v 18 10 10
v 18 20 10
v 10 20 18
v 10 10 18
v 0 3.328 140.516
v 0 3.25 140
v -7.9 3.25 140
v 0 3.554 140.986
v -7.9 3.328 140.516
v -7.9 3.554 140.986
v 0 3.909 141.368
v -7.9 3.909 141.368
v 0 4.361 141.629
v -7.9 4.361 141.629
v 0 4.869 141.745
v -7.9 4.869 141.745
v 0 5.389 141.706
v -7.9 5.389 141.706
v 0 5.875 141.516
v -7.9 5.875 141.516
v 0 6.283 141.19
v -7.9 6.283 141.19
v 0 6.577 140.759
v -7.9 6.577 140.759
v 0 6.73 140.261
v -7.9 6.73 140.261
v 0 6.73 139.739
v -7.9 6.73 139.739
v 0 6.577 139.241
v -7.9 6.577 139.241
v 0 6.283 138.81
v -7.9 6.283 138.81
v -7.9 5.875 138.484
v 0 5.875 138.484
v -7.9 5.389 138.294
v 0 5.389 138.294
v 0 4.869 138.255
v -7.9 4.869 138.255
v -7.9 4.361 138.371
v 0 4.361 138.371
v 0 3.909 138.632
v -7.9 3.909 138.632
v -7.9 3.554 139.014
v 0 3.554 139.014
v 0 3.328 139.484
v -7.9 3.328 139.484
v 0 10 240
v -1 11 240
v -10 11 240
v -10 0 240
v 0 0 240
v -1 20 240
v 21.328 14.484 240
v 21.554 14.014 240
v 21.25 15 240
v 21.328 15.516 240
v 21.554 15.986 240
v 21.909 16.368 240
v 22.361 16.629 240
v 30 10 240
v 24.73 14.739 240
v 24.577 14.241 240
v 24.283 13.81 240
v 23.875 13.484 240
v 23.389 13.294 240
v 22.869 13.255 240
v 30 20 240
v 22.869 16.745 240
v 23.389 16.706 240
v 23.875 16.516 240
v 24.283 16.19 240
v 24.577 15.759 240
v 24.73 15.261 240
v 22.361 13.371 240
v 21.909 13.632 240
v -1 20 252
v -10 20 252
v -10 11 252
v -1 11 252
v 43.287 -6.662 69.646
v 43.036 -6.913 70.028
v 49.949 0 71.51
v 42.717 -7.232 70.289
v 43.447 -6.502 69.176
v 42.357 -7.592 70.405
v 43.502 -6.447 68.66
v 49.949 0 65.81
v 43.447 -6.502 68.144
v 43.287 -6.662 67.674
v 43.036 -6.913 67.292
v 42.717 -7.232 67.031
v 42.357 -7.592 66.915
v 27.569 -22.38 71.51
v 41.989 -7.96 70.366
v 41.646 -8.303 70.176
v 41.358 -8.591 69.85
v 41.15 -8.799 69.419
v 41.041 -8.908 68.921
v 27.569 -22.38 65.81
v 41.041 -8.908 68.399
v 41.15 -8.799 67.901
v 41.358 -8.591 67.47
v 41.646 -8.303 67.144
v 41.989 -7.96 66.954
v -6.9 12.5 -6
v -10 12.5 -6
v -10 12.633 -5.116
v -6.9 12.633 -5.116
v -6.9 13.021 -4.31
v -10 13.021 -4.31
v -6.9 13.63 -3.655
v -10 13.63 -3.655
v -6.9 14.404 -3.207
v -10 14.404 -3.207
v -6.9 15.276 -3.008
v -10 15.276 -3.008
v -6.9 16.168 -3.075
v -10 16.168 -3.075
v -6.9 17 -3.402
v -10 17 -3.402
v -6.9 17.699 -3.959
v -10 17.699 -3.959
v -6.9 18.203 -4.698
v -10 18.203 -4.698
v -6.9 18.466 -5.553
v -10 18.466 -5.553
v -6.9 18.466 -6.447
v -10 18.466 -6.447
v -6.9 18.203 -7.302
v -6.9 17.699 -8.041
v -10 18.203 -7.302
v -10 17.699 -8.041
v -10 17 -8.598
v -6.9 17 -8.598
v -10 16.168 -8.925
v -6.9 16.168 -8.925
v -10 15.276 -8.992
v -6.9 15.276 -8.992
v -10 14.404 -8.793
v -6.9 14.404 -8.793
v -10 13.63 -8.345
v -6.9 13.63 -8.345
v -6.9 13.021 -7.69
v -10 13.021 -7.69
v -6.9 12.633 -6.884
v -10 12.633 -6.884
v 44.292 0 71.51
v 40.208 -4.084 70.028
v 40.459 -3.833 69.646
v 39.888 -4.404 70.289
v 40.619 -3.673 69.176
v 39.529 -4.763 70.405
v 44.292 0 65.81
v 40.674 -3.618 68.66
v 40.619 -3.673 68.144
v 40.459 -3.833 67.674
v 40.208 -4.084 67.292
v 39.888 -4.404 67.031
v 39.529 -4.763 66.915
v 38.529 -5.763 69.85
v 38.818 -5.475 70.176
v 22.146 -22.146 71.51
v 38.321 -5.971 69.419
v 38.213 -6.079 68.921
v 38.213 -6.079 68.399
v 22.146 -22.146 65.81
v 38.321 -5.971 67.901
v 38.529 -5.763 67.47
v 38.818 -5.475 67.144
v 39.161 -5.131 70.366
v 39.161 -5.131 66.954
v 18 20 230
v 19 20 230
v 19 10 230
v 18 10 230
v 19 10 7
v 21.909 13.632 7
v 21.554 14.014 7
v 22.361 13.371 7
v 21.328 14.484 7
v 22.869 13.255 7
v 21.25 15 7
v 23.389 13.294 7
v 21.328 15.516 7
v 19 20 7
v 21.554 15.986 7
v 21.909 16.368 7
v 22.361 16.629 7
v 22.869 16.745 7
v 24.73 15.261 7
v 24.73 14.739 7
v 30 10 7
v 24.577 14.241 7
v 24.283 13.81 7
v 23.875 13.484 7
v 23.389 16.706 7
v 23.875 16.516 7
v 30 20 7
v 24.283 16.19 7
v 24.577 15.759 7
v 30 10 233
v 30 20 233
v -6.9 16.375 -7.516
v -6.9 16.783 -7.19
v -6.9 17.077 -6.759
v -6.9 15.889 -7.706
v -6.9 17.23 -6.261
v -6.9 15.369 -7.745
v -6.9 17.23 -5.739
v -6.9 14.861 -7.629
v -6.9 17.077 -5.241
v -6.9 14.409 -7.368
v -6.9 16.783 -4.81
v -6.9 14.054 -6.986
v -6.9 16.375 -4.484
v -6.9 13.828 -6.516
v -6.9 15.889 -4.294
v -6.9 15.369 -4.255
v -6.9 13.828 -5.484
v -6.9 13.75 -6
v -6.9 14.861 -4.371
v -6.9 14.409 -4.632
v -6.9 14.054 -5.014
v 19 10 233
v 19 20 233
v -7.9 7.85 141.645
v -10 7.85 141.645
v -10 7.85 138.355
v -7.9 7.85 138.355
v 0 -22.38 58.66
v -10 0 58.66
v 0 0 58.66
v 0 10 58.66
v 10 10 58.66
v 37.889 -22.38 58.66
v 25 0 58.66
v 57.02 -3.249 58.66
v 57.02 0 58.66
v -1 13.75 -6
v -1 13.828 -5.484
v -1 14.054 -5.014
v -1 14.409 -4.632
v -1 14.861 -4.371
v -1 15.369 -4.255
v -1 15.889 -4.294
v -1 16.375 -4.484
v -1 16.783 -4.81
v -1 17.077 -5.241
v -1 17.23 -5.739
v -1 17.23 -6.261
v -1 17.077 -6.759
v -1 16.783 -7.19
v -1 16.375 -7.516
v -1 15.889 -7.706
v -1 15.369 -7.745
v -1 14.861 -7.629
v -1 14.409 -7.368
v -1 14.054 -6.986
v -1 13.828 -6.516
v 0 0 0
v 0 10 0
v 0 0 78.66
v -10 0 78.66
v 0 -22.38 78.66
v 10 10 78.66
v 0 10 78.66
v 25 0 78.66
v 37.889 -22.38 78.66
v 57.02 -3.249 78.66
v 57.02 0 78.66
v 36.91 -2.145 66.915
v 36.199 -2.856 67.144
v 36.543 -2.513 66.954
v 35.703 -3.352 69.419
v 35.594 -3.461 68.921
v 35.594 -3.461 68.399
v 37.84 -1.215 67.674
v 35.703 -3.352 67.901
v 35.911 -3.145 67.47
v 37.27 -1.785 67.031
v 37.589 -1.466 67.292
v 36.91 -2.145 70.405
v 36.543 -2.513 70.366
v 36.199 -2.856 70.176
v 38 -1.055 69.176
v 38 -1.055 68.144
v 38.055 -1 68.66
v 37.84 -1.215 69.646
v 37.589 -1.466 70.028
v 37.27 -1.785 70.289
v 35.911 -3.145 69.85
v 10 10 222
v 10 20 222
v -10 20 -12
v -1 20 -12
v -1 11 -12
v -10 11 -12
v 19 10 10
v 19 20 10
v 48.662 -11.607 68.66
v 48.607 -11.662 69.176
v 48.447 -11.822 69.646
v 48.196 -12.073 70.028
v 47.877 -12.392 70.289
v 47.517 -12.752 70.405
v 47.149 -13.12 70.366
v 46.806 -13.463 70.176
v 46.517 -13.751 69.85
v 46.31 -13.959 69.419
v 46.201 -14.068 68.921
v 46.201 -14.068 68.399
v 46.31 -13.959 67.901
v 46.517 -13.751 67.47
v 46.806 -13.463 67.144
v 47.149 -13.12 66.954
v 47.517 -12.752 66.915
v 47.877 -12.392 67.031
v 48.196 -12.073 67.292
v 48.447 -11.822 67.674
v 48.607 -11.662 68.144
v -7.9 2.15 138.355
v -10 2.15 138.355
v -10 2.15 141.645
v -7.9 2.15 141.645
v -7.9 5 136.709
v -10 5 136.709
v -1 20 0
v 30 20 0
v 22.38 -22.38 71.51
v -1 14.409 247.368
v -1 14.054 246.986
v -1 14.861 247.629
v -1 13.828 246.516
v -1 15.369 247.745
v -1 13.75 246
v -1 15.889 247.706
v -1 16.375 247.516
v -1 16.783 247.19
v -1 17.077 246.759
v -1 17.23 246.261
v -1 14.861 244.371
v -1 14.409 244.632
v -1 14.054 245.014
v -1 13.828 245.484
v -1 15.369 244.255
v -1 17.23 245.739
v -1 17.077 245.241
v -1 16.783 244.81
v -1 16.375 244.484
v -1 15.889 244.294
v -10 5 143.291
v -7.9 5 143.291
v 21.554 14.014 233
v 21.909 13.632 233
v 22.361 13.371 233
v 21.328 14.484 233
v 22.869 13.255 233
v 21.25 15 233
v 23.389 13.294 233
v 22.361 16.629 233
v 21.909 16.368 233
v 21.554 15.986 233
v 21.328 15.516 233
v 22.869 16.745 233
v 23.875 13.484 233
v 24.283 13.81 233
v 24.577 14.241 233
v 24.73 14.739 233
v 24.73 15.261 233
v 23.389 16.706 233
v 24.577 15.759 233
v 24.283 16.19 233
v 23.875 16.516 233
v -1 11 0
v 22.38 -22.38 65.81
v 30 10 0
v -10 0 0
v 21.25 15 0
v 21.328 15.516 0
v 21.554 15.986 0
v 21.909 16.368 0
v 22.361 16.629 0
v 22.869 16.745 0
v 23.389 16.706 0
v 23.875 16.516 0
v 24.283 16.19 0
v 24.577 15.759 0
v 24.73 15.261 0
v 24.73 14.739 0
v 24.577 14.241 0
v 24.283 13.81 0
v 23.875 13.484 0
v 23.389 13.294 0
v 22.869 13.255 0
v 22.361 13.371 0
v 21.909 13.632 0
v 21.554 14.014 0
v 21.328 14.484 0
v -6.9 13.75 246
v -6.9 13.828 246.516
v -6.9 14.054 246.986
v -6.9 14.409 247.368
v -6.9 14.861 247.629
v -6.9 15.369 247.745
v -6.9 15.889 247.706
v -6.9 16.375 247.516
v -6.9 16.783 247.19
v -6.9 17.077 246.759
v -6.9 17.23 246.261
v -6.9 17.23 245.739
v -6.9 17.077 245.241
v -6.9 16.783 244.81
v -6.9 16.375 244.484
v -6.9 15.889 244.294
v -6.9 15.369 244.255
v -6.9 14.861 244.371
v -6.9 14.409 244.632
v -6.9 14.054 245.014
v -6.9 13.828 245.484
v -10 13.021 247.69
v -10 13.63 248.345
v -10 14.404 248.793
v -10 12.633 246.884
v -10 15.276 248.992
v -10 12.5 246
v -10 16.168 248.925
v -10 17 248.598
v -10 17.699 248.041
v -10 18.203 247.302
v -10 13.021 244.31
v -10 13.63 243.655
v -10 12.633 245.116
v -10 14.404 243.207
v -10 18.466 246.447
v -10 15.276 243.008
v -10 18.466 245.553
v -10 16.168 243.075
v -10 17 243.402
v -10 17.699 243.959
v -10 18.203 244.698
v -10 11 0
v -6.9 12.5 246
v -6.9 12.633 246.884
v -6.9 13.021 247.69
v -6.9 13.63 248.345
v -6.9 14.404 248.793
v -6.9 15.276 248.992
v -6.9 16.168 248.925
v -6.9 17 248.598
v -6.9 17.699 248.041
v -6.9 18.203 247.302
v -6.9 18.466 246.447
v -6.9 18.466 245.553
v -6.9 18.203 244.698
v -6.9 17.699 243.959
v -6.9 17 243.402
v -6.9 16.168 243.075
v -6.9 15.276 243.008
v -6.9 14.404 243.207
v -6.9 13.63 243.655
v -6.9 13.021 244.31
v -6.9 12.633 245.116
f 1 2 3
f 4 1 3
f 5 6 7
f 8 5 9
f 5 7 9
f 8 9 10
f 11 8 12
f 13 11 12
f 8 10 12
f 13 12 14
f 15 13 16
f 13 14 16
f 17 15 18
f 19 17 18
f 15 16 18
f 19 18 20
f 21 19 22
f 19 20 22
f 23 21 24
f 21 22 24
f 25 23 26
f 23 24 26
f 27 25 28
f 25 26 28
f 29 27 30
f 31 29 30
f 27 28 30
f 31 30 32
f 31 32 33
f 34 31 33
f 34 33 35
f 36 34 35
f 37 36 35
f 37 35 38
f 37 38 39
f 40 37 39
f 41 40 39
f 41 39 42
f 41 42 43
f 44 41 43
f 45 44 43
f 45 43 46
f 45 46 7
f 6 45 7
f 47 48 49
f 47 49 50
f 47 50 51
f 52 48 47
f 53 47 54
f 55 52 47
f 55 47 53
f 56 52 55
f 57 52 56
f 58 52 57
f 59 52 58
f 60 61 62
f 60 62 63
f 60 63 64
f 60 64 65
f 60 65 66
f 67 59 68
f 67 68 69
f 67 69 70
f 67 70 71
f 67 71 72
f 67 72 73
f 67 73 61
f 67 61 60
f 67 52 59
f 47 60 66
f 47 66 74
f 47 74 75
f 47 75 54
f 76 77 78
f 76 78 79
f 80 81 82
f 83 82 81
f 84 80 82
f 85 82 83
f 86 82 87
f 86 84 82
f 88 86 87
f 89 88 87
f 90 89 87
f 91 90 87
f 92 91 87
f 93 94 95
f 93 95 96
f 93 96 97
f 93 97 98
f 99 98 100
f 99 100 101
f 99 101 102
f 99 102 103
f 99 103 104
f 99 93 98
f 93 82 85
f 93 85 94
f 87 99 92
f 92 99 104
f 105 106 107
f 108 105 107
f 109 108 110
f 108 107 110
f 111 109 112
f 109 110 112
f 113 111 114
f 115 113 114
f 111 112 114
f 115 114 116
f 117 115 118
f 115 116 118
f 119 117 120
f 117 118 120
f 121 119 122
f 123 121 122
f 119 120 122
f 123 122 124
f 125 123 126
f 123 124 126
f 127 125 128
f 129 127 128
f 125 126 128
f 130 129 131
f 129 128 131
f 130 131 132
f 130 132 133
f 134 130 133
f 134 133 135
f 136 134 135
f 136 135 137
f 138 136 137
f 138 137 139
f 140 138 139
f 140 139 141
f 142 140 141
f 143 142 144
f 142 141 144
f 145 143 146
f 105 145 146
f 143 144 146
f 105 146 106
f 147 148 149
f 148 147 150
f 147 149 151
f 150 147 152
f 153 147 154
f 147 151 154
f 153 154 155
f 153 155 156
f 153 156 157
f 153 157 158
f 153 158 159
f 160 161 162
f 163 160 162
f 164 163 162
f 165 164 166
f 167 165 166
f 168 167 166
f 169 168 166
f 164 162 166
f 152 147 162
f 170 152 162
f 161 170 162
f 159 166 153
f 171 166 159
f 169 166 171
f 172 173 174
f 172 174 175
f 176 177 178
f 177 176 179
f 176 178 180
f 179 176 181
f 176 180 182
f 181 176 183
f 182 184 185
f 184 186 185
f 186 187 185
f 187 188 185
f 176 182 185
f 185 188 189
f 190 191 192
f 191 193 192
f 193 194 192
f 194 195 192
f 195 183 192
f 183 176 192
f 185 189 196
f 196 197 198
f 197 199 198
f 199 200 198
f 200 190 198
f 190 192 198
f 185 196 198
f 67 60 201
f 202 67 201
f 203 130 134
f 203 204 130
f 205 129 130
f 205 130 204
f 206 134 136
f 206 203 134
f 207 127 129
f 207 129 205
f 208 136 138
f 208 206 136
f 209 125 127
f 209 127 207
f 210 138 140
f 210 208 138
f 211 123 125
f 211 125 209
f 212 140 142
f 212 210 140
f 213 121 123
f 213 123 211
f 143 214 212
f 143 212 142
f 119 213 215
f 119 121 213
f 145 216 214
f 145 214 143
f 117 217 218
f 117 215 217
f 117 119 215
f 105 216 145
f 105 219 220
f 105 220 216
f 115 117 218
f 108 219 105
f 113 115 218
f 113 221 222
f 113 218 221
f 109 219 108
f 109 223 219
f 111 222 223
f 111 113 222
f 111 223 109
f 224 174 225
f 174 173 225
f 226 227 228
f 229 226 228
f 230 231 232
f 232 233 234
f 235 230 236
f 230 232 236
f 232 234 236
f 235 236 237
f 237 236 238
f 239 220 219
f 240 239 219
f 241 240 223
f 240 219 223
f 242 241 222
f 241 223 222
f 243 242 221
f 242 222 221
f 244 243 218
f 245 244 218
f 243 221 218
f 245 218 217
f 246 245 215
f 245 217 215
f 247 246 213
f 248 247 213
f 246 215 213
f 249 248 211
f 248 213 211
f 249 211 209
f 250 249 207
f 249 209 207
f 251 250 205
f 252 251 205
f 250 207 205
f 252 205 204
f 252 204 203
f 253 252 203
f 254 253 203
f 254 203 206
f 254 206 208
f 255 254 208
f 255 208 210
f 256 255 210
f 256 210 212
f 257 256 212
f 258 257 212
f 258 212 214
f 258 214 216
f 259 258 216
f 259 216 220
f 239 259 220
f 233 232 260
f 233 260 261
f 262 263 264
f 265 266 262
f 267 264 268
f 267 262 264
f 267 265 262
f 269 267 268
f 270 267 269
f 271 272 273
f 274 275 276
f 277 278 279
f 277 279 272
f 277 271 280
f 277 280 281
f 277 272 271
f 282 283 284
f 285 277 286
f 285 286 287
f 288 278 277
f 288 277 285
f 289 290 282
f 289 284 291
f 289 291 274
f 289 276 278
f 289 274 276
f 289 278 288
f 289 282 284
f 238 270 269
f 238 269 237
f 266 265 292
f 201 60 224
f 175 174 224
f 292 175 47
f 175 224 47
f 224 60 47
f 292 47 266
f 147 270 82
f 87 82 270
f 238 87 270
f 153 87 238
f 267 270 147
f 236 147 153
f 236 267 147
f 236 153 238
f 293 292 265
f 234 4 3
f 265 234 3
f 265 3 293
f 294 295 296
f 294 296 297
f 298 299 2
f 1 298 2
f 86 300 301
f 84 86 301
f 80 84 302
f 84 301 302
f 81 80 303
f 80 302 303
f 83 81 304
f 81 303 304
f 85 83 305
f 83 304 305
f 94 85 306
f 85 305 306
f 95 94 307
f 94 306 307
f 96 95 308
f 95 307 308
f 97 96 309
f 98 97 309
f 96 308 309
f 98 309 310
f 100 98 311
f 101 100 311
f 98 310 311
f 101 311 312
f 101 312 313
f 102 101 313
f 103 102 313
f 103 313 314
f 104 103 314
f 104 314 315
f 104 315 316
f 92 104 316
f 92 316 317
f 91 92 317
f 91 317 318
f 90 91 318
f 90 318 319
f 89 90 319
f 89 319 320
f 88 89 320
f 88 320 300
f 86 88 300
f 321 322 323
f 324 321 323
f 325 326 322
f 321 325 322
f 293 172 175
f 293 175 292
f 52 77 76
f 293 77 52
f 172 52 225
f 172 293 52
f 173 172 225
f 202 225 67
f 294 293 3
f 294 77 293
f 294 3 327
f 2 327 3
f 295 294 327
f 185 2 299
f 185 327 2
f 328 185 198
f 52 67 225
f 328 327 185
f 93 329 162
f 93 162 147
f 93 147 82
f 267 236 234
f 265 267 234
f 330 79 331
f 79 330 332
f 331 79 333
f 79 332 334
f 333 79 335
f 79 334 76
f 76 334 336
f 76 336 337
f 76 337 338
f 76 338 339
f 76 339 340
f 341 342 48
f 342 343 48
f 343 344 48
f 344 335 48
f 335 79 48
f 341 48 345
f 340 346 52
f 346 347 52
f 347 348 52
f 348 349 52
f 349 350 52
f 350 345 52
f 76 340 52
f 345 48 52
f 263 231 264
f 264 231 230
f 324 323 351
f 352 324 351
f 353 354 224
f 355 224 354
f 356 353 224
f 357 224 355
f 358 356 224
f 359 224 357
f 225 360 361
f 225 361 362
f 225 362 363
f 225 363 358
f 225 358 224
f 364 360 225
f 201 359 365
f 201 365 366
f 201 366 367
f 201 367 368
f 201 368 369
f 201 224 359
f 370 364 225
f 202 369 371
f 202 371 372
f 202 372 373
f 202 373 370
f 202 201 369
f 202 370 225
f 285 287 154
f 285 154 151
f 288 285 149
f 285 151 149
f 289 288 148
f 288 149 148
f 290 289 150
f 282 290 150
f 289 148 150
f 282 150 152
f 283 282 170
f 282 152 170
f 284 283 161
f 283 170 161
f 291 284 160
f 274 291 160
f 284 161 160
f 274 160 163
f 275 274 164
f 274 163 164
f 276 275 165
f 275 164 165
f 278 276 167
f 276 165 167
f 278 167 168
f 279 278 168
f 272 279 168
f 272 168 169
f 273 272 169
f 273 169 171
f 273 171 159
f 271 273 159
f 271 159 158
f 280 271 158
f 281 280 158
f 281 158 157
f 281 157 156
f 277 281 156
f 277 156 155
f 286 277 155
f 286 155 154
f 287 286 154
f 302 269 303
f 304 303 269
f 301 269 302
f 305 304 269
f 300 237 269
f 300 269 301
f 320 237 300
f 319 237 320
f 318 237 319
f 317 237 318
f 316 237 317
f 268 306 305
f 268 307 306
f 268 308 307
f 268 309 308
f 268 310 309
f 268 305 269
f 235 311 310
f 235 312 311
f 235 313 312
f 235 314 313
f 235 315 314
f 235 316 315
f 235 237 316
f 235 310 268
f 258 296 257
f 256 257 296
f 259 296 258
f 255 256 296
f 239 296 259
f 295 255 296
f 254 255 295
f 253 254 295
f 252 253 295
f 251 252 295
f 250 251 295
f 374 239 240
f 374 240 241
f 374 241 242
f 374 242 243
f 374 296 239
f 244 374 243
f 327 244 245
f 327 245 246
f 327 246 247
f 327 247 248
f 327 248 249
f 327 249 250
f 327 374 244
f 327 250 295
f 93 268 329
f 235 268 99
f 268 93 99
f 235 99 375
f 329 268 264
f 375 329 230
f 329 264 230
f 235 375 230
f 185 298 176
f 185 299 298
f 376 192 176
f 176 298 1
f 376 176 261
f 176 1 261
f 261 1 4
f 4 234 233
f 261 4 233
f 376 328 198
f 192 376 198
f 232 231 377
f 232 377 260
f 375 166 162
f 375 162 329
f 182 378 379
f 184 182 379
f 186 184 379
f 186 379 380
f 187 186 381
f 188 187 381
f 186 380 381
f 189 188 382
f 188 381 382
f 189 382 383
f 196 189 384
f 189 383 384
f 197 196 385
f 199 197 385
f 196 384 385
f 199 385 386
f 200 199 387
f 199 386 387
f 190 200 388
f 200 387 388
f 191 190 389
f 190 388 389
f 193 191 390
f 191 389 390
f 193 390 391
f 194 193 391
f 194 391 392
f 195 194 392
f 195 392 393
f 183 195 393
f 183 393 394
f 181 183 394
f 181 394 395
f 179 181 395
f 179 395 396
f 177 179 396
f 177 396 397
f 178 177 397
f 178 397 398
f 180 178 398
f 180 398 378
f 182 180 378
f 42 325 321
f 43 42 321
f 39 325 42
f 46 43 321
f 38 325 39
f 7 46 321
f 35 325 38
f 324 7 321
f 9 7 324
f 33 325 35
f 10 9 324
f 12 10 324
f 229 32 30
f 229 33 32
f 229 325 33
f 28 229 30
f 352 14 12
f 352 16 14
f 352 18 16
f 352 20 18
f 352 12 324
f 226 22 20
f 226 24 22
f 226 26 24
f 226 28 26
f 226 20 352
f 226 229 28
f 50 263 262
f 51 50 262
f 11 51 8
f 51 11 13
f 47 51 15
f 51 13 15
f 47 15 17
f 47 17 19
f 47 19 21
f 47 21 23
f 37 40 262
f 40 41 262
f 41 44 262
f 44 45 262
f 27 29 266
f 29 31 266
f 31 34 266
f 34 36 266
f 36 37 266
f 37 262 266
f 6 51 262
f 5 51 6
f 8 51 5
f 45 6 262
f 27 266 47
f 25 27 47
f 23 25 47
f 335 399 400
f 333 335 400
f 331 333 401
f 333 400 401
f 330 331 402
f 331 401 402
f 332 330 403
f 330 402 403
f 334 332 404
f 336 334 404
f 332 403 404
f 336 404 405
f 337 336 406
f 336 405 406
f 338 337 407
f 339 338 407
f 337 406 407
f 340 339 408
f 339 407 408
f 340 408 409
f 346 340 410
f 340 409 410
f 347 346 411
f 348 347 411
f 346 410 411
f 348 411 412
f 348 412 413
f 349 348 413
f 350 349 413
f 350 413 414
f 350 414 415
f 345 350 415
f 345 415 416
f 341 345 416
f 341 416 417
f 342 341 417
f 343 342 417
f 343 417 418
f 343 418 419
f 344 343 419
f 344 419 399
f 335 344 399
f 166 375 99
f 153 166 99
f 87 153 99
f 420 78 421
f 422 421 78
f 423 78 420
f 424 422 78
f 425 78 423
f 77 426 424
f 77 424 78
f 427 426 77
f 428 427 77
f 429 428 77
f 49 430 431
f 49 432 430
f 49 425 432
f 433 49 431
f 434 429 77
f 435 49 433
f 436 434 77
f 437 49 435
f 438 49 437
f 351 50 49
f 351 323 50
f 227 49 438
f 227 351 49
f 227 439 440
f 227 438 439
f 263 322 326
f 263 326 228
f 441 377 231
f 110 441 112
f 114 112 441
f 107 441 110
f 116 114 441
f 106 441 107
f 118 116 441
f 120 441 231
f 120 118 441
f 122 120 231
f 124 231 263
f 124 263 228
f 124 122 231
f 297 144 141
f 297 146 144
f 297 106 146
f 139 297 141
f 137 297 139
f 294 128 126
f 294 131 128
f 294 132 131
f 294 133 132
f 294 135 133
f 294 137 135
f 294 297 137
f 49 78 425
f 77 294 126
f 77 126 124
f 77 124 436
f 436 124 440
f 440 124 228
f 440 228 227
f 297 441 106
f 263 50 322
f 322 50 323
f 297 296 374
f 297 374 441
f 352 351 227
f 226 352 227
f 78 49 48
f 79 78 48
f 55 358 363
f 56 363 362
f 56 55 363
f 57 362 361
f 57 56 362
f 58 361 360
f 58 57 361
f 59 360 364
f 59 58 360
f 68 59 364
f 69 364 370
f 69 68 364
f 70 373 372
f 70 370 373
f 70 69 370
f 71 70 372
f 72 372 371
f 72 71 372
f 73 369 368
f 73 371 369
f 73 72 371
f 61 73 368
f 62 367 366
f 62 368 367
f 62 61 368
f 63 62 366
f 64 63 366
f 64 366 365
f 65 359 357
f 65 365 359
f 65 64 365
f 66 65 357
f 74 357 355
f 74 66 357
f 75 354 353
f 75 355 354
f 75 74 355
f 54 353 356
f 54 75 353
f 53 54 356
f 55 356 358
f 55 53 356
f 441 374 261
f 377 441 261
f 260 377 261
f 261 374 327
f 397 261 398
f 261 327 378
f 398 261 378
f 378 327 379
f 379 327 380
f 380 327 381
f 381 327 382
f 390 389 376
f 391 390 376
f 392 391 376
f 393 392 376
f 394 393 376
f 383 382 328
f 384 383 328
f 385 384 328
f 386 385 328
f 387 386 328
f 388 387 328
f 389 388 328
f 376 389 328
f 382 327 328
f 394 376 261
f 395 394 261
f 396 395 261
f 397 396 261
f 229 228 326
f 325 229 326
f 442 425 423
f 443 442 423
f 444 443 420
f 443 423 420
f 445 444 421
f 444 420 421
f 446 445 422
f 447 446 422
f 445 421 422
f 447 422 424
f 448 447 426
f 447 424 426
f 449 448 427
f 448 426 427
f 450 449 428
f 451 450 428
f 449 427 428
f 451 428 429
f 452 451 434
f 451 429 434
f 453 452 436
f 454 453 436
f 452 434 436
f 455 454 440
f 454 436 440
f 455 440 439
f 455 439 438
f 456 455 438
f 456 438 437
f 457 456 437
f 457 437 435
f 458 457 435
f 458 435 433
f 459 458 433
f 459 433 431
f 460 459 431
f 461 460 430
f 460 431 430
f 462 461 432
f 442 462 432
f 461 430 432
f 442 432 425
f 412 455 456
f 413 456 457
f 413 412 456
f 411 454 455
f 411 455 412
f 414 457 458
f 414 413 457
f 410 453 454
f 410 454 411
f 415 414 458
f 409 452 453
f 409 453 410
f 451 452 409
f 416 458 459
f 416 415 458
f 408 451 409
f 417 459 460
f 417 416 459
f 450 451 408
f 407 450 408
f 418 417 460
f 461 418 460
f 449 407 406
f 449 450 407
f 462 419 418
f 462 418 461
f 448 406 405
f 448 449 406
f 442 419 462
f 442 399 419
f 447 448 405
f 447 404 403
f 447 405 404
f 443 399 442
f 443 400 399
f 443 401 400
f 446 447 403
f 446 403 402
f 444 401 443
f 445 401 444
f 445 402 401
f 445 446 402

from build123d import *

# Parameters (mm, degrees)
BOSS_EXTRUDE1_DEPTH = 240
BOSS_EXTRUDE3_DEPTH = 10
SKETCH5_R           = 1.75
CUT_EXTRUDE1_DEPTH  = 243.69322199
SKETCH6_W           = 7
SKETCH6_H           = 12
CUT_EXTRUDE2_DEPTH  = 11
SKETCH7_W           = 20
SKETCH7_H           = 22.38
BOSS_EXTRUDE4_DEPTH = 57.02
BOSS_EXTRUDE5_DEPTH = 20
CUT_EXTRUDE3_DEPTH  = 20
SKETCH14_W          = 9
SKETCH14_H          = 9
BOSS_EXTRUDE6_DEPTH = 12
SKETCH15_W          = 9
SKETCH15_H          = 9
BOSS_EXTRUDE7_DEPTH = 12
SKETCH18_R          = 1.75
CUT_EXTRUDE10_DEPTH = 9
SKETCH19_R          = 3
CUT_EXTRUDE11_DEPTH = 3.1
SKETCH20_R          = 1.75
CUT_EXTRUDE12_DEPTH = 10
CUT_EXTRUDE13_DEPTH = 2.1
SKETCH22_R          = 1.75
CUT_EXTRUDE14_DEPTH = 15
SKETCH24_W          = 4
SKETCH24_H          = 5.7
CUT_EXTRUDE15_DEPTH = 260.337896961


with BuildPart() as part:
    # Sketch1 → Boss-Extrude1 (new body)
    with BuildSketch(Plane.XY):
        Polygon((-10, 0), (0, 0), (0, 10), (10, 10), (10, 20), (-10, 20), align=None)
    extrude(amount=BOSS_EXTRUDE1_DEPTH)

    # Sketch4 → Boss-Extrude3 (add)
    with BuildSketch(Plane(origin=(0, 20, 0), x_dir=(1, 0, 0), z_dir=(0, 1, 0))):
        Polygon((10, 0), (30, 0), (30, -10), (18, -10), (10, -18), align=None)
    boss_extrude3 = extrude(amount=-BOSS_EXTRUDE3_DEPTH)

    # Sketch5 → Cut-Extrude1 (cut, through all)
    with BuildSketch(Plane(origin=(0, 0, 0), x_dir=(-1, 0, 0), z_dir=(0, 0, -1))):
        with Locations((-23, 15)):
            Circle(SKETCH5_R)
    cut_extrude1 = extrude(amount=-CUT_EXTRUDE1_DEPTH, mode=Mode.SUBTRACT)

    # Sketch6 → Cut-Extrude2 (cut)
    with BuildSketch(Plane(origin=(30, 0, 0), x_dir=(0, 0, -1), z_dir=(1, 0, 0))):
        with Locations((-10.5, 15)):
            Rectangle(SKETCH6_W, SKETCH6_H)
    cut_extrude2 = extrude(amount=-CUT_EXTRUDE2_DEPTH, mode=Mode.SUBTRACT)

    # Mirror1: Boss-Extrude3, Cut-Extrude1, Cut-Extrude2 across plane
    add(boss_extrude3.mirror(Plane(origin=(0, 0, 120), x_dir=(1, 0, 0), z_dir=(0, 0, -1))))
    add(cut_extrude1.mirror(Plane(origin=(0, 0, 120), x_dir=(1, 0, 0), z_dir=(0, 0, -1))), mode=Mode.SUBTRACT)
    add(cut_extrude2.mirror(Plane(origin=(0, 0, 120), x_dir=(1, 0, 0), z_dir=(0, 0, -1))), mode=Mode.SUBTRACT)



with BuildPart() as body_2:
    # Sketch7 → Boss-Extrude4 (new body)
    with BuildSketch(Plane(origin=(0, 0, 0), x_dir=(0, 0, -1), z_dir=(1, 0, 0))):
        with Locations((-68.66, -11.19)):
            Rectangle(SKETCH7_W, SKETCH7_H)
    extrude(amount=BOSS_EXTRUDE4_DEPTH)


with BuildPart() as part_1:
    add(part.part)

    add(body_2.part)  # Boss-Extrude5 merges body 2
    # Sketch9 → Boss-Extrude5 (add)
    with BuildSketch(Plane(origin=(0, 0, 58.66), x_dir=(-1, 0, 0), z_dir=(0, 0, -1))):
        Polygon((-10, 10), (10, 10), (10, 0), (0, -22.38), (-25, -22.38), (-25, 0), align=None)
    extrude(amount=-BOSS_EXTRUDE5_DEPTH)

    # Sketch10 → Cut-Extrude3 (cut)
    with BuildSketch(Plane(origin=(0, 0, 58.66), x_dir=(-1, 0, 0), z_dir=(0, 0, -1))):
        Polygon((-31.667249158, -28.601477466), (-43.135001652, -40.069229961), (-74.531570141, -8.672661471), (-63.063817647, 2.795091023), align=None)
    extrude(amount=-CUT_EXTRUDE3_DEPTH, mode=Mode.SUBTRACT)

    # Sketch14 → Boss-Extrude6 (add)
    with BuildSketch(Plane(origin=(0, 0, 0), x_dir=(-1, 0, 0), z_dir=(0, 0, -1))):
        with Locations((5.5, 15.5)):
            Rectangle(SKETCH14_W, SKETCH14_H)
    extrude(amount=BOSS_EXTRUDE6_DEPTH)

    # Sketch15 → Boss-Extrude7 (add)
    with BuildSketch(Plane.XY.offset(240)):
        with Locations((-5.5, 15.5)):
            Rectangle(SKETCH15_W, SKETCH15_H)
    extrude(amount=BOSS_EXTRUDE7_DEPTH)

    # Sketch18 → Cut-Extrude10 (cut)
    with BuildSketch(Plane.ZY.offset(10)):
        with Locations(Location((-6, 15.5, 0), (0, 0, 270))):
            Circle(SKETCH18_R)
        with Locations(Location((246, 15.5, 0), (0, 0, 270))):
            Circle(SKETCH18_R)
    extrude(amount=-CUT_EXTRUDE10_DEPTH, mode=Mode.SUBTRACT)

    # Sketch19 → Cut-Extrude11 (cut)
    with BuildSketch(Plane.ZY.offset(10)):
        with Locations(Location((-6, 15.5, 0), (0, 0, 270))):
            Circle(SKETCH19_R)
        with Locations(Location((246, 15.5, 0), (0, 0, 270))):
            Circle(SKETCH19_R)
    extrude(amount=-CUT_EXTRUDE11_DEPTH, mode=Mode.SUBTRACT)

    # Sketch20 → Cut-Extrude12 (cut)
    with BuildSketch(Plane.ZY.offset(10)):
        with Locations(Location((140, 5, 0), (0, 0, 270))):
            Circle(SKETCH20_R)
    extrude(amount=-CUT_EXTRUDE12_DEPTH, mode=Mode.SUBTRACT)

    # Sketch21 → Cut-Extrude13 (cut)
    with BuildSketch(Plane.ZY.offset(10)):
        Polygon((141.645448267, 2.15), (143.290896534, 5), (141.645448267, 7.85), (138.354551733, 7.85), (136.709103466, 5), (138.354551733, 2.15), align=None)
    extrude(amount=-CUT_EXTRUDE13_DEPTH, mode=Mode.SUBTRACT)

    # Sketch22 → Cut-Extrude14 (cut)
    with BuildSketch(Plane(origin=(30.134363312, -30.134363312, 0), x_dir=(0, 0, -1), z_dir=(0.7071067811865474, -0.7071067811865477, 0))):
        with Locations(Location((-68.66, 24.452032037, 0), (0, 0, 90))):
            Circle(SKETCH22_R)
    extrude(amount=-CUT_EXTRUDE14_DEPTH, mode=Mode.SUBTRACT)

    # Sketch24 → Cut-Extrude15 (cut, through all)
    with BuildSketch(Plane(origin=(0, 0, 0), x_dir=(0.7071067811865477, -0.7071067811865475, 0), z_dir=(0.7071067811865475, 0.7071067811865477, 0))):
        with Locations((33.319228663, -68.66)):
            Rectangle(SKETCH24_W, SKETCH24_H)
    extrude(amount=CUT_EXTRUDE15_DEPTH, mode=Mode.SUBTRACT)


solid = part_1.part
